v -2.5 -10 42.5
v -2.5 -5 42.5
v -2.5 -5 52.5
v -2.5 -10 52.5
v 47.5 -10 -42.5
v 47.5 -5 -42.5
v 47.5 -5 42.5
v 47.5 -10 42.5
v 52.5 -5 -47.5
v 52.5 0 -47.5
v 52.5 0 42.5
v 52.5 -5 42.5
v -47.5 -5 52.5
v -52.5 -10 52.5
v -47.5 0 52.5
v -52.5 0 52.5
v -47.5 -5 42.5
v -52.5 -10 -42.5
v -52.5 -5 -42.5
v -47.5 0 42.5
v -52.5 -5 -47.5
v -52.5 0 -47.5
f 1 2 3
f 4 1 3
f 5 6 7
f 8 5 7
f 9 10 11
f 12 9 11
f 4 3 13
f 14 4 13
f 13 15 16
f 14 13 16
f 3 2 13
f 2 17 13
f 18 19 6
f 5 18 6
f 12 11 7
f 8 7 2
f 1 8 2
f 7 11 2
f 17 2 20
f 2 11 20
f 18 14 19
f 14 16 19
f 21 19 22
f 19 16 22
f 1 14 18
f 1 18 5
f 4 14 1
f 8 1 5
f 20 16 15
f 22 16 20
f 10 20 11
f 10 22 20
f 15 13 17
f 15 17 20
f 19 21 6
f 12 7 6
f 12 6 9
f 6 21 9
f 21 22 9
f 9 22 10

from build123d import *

# Parameters (mm, degrees)
F0_W      = 105
F0_H      = 95
F1_DEPTH  = 5
F2_W      = 50
F2_H      = 5
F3_DEPTH  = 5
F5_DEPTH  = 5
F6_W      = 5
F6_H      = 5
F7_DEPTH  = 45
F8_W      = 10
F8_H      = 5
F9_DEPTH  = 5
F9_FACE_W = 5
F9_FACE_H = 5
F10_DEPTH = 90


with BuildPart() as f1:
    # F0 (on Front) → F1 (new body)
    with BuildSketch(Plane.XZ):
        Rectangle(F0_W, F0_H)
    extrude(amount=F1_DEPTH)

    # F2 (on face) → F3 (join)
    with BuildSketch(Plane.XY.offset(47.5)):
        with Locations((-27.5, -2.5)):
            Rectangle(F2_W, F2_H)
    extrude(amount=F3_DEPTH)

    # F4 (on face) → F5 (join)
    with BuildSketch(Plane.XZ.offset(5)):
        Polygon((-2.5, 42.5), (-2.5, 47.5), (-2.5, 52.5), (-52.5, 52.5), (-52.5, -42.5), (47.5, -42.5), (47.5, 42.5), align=None)
    extrude(amount=F5_DEPTH)

    # F6 (on face) → F7 (cut)
    with BuildSketch(Plane.YZ.offset(-2.5)):
        with Locations((-2.5, 50)):
            Rectangle(F6_W, F6_H)
    extrude(amount=-F7_DEPTH, mode=Mode.SUBTRACT)

    # F8 (on face) → F9 (cut)
    with BuildSketch(Plane.XY.offset(47.5)):
        with Locations((-42.5, -2.5)):
            Rectangle(F8_W, F8_H)
    extrude(amount=-F9_DEPTH, mode=Mode.SUBTRACT)

    # F9_face (on face) → F10 (cut)
    with BuildSketch(Plane(origin=(-37.5, -2.5, 45), x_dir=(0, -1, 0), z_dir=(-1, 0, 0))):
        Rectangle(F9_FACE_W, F9_FACE_H)
    extrude(amount=-F10_DEPTH, mode=Mode.SUBTRACT)


solid = f1.part
